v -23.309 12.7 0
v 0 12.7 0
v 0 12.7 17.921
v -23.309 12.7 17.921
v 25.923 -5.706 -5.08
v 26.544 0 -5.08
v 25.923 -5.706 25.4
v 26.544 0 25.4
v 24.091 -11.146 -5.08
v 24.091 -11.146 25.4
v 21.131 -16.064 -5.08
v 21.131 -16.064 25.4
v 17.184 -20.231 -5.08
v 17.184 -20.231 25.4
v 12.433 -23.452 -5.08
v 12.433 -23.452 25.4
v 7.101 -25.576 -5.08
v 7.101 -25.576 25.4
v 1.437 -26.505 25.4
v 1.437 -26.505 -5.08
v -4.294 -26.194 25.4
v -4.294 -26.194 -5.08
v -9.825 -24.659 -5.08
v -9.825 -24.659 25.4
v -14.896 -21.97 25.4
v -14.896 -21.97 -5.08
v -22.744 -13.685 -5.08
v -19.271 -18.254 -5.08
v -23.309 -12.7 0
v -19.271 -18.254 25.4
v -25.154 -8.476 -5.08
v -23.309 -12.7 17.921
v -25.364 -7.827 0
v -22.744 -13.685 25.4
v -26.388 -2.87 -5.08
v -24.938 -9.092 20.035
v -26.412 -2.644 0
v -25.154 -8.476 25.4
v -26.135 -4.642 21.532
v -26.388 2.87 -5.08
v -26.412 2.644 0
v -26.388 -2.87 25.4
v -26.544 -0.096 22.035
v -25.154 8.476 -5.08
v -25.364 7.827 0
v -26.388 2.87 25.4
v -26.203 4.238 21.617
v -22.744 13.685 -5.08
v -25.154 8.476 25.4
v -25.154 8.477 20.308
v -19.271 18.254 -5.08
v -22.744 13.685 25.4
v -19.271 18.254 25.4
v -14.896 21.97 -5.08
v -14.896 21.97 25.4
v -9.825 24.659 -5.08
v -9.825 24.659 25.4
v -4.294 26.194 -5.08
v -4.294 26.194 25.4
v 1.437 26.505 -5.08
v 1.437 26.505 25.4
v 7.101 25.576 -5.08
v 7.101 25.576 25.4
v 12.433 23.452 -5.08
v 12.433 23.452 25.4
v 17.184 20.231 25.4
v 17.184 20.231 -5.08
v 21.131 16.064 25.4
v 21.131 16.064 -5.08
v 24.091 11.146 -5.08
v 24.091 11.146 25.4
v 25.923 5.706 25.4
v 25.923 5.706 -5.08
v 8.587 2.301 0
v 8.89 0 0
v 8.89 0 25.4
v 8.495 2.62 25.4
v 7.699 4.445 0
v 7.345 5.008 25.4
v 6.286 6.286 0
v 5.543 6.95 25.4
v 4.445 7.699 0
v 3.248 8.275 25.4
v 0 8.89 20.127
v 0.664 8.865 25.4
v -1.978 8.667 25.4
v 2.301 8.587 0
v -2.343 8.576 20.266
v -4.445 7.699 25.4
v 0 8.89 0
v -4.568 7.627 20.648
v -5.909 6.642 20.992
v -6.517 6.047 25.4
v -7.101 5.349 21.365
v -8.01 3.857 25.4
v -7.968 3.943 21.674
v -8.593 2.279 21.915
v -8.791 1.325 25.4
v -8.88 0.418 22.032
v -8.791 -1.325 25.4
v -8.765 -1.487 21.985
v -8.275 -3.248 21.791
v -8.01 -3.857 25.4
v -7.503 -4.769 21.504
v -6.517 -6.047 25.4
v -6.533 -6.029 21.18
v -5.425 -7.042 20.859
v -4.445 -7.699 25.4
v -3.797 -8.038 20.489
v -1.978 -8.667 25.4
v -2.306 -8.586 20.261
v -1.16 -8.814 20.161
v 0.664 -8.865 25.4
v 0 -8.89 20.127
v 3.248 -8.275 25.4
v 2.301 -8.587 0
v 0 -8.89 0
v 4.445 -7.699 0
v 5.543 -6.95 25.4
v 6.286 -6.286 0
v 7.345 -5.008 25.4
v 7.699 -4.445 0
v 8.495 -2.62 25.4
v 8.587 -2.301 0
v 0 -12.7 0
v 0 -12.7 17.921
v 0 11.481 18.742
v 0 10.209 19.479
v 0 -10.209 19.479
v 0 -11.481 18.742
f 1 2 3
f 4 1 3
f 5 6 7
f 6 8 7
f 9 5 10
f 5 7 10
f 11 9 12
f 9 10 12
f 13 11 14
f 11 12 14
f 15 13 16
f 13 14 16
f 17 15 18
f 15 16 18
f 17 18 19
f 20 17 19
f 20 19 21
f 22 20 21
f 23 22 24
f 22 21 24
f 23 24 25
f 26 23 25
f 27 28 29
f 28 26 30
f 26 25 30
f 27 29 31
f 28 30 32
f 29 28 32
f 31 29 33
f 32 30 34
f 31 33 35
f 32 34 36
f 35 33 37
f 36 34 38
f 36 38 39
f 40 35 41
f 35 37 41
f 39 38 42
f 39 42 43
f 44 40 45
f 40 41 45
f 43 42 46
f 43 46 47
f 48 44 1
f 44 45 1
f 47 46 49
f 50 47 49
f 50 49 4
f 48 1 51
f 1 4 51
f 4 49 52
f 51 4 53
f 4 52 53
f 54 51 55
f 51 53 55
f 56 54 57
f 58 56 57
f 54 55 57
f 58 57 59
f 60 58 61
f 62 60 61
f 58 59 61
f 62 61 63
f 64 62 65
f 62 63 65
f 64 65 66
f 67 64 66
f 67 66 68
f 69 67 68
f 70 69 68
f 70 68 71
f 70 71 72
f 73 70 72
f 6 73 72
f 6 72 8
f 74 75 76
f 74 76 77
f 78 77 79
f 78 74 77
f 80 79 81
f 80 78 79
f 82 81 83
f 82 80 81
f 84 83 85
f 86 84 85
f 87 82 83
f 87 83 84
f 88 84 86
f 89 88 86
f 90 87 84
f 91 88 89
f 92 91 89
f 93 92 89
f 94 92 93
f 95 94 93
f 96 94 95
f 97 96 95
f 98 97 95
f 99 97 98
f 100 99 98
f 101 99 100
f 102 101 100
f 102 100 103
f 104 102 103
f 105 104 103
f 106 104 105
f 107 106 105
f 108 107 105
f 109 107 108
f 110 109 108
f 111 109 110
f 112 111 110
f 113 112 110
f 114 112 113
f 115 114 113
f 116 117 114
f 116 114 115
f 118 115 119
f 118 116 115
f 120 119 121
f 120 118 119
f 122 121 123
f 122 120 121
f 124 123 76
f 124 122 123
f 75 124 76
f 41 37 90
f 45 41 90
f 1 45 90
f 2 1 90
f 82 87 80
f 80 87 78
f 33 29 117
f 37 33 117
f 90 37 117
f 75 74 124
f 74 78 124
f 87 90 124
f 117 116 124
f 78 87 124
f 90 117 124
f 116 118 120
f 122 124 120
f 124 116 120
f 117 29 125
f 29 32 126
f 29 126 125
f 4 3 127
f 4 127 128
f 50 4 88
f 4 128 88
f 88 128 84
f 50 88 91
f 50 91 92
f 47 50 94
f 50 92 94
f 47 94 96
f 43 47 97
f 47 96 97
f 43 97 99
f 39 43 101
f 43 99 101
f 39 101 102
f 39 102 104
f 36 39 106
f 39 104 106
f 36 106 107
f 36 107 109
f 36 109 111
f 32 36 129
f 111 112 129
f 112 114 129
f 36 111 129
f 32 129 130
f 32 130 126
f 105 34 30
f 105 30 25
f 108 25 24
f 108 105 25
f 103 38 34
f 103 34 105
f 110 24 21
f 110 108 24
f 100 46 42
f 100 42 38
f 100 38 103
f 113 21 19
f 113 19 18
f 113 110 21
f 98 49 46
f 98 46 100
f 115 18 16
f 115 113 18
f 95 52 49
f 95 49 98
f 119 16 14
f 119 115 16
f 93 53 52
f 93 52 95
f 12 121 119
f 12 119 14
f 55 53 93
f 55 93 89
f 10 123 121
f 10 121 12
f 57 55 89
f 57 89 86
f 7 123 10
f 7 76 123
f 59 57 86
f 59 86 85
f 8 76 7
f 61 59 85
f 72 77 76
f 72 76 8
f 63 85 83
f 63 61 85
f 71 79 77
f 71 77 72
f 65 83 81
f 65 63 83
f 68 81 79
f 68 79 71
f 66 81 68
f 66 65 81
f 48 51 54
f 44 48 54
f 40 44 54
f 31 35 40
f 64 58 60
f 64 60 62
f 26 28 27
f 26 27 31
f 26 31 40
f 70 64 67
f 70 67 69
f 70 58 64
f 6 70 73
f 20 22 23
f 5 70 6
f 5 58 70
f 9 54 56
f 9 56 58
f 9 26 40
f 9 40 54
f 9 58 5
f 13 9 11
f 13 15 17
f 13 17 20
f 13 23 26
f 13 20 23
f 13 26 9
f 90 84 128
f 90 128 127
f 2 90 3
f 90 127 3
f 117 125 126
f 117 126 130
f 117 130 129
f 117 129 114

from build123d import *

# Parameters (mm, degrees)
F0_R     = 26.543977
F0_R_2   = 8.89
F1_DEPTH = 25.4
F3_DEPTH = 50.8
F4_R     = 26.543977
F5_DEPTH = 5.08


with BuildPart() as f1:
    # F0 (on Top) → F1 (new body)
    with BuildSketch(Plane.XY):
        Circle(F0_R)
        Circle(F0_R_2, mode=Mode.SUBTRACT)
    extrude(amount=F1_DEPTH)

    # F2 (on Right) → F3 (cut)
    with BuildSketch(Plane.YZ):
        with BuildLine():
            Line((-12.7, 17.921465), (-12.7, 0))
            Line((-12.7, 0), (12.7, 0))
            Line((12.7, 0), (12.7, 17.921465))
            ThreePointArc((12.7, 17.921465), (0, 22.035668), (-12.7, 17.921465))
        make_face()
    extrude(amount=-F3_DEPTH, mode=Mode.SUBTRACT)

    # F4 (on face) → F5 (join)
    with BuildSketch(Plane(origin=(0, 0, 0), x_dir=(1, 0, 0), z_dir=(0, 0, -1))):
        Circle(F4_R)
    extrude(amount=F5_DEPTH)


solid = f1.part
